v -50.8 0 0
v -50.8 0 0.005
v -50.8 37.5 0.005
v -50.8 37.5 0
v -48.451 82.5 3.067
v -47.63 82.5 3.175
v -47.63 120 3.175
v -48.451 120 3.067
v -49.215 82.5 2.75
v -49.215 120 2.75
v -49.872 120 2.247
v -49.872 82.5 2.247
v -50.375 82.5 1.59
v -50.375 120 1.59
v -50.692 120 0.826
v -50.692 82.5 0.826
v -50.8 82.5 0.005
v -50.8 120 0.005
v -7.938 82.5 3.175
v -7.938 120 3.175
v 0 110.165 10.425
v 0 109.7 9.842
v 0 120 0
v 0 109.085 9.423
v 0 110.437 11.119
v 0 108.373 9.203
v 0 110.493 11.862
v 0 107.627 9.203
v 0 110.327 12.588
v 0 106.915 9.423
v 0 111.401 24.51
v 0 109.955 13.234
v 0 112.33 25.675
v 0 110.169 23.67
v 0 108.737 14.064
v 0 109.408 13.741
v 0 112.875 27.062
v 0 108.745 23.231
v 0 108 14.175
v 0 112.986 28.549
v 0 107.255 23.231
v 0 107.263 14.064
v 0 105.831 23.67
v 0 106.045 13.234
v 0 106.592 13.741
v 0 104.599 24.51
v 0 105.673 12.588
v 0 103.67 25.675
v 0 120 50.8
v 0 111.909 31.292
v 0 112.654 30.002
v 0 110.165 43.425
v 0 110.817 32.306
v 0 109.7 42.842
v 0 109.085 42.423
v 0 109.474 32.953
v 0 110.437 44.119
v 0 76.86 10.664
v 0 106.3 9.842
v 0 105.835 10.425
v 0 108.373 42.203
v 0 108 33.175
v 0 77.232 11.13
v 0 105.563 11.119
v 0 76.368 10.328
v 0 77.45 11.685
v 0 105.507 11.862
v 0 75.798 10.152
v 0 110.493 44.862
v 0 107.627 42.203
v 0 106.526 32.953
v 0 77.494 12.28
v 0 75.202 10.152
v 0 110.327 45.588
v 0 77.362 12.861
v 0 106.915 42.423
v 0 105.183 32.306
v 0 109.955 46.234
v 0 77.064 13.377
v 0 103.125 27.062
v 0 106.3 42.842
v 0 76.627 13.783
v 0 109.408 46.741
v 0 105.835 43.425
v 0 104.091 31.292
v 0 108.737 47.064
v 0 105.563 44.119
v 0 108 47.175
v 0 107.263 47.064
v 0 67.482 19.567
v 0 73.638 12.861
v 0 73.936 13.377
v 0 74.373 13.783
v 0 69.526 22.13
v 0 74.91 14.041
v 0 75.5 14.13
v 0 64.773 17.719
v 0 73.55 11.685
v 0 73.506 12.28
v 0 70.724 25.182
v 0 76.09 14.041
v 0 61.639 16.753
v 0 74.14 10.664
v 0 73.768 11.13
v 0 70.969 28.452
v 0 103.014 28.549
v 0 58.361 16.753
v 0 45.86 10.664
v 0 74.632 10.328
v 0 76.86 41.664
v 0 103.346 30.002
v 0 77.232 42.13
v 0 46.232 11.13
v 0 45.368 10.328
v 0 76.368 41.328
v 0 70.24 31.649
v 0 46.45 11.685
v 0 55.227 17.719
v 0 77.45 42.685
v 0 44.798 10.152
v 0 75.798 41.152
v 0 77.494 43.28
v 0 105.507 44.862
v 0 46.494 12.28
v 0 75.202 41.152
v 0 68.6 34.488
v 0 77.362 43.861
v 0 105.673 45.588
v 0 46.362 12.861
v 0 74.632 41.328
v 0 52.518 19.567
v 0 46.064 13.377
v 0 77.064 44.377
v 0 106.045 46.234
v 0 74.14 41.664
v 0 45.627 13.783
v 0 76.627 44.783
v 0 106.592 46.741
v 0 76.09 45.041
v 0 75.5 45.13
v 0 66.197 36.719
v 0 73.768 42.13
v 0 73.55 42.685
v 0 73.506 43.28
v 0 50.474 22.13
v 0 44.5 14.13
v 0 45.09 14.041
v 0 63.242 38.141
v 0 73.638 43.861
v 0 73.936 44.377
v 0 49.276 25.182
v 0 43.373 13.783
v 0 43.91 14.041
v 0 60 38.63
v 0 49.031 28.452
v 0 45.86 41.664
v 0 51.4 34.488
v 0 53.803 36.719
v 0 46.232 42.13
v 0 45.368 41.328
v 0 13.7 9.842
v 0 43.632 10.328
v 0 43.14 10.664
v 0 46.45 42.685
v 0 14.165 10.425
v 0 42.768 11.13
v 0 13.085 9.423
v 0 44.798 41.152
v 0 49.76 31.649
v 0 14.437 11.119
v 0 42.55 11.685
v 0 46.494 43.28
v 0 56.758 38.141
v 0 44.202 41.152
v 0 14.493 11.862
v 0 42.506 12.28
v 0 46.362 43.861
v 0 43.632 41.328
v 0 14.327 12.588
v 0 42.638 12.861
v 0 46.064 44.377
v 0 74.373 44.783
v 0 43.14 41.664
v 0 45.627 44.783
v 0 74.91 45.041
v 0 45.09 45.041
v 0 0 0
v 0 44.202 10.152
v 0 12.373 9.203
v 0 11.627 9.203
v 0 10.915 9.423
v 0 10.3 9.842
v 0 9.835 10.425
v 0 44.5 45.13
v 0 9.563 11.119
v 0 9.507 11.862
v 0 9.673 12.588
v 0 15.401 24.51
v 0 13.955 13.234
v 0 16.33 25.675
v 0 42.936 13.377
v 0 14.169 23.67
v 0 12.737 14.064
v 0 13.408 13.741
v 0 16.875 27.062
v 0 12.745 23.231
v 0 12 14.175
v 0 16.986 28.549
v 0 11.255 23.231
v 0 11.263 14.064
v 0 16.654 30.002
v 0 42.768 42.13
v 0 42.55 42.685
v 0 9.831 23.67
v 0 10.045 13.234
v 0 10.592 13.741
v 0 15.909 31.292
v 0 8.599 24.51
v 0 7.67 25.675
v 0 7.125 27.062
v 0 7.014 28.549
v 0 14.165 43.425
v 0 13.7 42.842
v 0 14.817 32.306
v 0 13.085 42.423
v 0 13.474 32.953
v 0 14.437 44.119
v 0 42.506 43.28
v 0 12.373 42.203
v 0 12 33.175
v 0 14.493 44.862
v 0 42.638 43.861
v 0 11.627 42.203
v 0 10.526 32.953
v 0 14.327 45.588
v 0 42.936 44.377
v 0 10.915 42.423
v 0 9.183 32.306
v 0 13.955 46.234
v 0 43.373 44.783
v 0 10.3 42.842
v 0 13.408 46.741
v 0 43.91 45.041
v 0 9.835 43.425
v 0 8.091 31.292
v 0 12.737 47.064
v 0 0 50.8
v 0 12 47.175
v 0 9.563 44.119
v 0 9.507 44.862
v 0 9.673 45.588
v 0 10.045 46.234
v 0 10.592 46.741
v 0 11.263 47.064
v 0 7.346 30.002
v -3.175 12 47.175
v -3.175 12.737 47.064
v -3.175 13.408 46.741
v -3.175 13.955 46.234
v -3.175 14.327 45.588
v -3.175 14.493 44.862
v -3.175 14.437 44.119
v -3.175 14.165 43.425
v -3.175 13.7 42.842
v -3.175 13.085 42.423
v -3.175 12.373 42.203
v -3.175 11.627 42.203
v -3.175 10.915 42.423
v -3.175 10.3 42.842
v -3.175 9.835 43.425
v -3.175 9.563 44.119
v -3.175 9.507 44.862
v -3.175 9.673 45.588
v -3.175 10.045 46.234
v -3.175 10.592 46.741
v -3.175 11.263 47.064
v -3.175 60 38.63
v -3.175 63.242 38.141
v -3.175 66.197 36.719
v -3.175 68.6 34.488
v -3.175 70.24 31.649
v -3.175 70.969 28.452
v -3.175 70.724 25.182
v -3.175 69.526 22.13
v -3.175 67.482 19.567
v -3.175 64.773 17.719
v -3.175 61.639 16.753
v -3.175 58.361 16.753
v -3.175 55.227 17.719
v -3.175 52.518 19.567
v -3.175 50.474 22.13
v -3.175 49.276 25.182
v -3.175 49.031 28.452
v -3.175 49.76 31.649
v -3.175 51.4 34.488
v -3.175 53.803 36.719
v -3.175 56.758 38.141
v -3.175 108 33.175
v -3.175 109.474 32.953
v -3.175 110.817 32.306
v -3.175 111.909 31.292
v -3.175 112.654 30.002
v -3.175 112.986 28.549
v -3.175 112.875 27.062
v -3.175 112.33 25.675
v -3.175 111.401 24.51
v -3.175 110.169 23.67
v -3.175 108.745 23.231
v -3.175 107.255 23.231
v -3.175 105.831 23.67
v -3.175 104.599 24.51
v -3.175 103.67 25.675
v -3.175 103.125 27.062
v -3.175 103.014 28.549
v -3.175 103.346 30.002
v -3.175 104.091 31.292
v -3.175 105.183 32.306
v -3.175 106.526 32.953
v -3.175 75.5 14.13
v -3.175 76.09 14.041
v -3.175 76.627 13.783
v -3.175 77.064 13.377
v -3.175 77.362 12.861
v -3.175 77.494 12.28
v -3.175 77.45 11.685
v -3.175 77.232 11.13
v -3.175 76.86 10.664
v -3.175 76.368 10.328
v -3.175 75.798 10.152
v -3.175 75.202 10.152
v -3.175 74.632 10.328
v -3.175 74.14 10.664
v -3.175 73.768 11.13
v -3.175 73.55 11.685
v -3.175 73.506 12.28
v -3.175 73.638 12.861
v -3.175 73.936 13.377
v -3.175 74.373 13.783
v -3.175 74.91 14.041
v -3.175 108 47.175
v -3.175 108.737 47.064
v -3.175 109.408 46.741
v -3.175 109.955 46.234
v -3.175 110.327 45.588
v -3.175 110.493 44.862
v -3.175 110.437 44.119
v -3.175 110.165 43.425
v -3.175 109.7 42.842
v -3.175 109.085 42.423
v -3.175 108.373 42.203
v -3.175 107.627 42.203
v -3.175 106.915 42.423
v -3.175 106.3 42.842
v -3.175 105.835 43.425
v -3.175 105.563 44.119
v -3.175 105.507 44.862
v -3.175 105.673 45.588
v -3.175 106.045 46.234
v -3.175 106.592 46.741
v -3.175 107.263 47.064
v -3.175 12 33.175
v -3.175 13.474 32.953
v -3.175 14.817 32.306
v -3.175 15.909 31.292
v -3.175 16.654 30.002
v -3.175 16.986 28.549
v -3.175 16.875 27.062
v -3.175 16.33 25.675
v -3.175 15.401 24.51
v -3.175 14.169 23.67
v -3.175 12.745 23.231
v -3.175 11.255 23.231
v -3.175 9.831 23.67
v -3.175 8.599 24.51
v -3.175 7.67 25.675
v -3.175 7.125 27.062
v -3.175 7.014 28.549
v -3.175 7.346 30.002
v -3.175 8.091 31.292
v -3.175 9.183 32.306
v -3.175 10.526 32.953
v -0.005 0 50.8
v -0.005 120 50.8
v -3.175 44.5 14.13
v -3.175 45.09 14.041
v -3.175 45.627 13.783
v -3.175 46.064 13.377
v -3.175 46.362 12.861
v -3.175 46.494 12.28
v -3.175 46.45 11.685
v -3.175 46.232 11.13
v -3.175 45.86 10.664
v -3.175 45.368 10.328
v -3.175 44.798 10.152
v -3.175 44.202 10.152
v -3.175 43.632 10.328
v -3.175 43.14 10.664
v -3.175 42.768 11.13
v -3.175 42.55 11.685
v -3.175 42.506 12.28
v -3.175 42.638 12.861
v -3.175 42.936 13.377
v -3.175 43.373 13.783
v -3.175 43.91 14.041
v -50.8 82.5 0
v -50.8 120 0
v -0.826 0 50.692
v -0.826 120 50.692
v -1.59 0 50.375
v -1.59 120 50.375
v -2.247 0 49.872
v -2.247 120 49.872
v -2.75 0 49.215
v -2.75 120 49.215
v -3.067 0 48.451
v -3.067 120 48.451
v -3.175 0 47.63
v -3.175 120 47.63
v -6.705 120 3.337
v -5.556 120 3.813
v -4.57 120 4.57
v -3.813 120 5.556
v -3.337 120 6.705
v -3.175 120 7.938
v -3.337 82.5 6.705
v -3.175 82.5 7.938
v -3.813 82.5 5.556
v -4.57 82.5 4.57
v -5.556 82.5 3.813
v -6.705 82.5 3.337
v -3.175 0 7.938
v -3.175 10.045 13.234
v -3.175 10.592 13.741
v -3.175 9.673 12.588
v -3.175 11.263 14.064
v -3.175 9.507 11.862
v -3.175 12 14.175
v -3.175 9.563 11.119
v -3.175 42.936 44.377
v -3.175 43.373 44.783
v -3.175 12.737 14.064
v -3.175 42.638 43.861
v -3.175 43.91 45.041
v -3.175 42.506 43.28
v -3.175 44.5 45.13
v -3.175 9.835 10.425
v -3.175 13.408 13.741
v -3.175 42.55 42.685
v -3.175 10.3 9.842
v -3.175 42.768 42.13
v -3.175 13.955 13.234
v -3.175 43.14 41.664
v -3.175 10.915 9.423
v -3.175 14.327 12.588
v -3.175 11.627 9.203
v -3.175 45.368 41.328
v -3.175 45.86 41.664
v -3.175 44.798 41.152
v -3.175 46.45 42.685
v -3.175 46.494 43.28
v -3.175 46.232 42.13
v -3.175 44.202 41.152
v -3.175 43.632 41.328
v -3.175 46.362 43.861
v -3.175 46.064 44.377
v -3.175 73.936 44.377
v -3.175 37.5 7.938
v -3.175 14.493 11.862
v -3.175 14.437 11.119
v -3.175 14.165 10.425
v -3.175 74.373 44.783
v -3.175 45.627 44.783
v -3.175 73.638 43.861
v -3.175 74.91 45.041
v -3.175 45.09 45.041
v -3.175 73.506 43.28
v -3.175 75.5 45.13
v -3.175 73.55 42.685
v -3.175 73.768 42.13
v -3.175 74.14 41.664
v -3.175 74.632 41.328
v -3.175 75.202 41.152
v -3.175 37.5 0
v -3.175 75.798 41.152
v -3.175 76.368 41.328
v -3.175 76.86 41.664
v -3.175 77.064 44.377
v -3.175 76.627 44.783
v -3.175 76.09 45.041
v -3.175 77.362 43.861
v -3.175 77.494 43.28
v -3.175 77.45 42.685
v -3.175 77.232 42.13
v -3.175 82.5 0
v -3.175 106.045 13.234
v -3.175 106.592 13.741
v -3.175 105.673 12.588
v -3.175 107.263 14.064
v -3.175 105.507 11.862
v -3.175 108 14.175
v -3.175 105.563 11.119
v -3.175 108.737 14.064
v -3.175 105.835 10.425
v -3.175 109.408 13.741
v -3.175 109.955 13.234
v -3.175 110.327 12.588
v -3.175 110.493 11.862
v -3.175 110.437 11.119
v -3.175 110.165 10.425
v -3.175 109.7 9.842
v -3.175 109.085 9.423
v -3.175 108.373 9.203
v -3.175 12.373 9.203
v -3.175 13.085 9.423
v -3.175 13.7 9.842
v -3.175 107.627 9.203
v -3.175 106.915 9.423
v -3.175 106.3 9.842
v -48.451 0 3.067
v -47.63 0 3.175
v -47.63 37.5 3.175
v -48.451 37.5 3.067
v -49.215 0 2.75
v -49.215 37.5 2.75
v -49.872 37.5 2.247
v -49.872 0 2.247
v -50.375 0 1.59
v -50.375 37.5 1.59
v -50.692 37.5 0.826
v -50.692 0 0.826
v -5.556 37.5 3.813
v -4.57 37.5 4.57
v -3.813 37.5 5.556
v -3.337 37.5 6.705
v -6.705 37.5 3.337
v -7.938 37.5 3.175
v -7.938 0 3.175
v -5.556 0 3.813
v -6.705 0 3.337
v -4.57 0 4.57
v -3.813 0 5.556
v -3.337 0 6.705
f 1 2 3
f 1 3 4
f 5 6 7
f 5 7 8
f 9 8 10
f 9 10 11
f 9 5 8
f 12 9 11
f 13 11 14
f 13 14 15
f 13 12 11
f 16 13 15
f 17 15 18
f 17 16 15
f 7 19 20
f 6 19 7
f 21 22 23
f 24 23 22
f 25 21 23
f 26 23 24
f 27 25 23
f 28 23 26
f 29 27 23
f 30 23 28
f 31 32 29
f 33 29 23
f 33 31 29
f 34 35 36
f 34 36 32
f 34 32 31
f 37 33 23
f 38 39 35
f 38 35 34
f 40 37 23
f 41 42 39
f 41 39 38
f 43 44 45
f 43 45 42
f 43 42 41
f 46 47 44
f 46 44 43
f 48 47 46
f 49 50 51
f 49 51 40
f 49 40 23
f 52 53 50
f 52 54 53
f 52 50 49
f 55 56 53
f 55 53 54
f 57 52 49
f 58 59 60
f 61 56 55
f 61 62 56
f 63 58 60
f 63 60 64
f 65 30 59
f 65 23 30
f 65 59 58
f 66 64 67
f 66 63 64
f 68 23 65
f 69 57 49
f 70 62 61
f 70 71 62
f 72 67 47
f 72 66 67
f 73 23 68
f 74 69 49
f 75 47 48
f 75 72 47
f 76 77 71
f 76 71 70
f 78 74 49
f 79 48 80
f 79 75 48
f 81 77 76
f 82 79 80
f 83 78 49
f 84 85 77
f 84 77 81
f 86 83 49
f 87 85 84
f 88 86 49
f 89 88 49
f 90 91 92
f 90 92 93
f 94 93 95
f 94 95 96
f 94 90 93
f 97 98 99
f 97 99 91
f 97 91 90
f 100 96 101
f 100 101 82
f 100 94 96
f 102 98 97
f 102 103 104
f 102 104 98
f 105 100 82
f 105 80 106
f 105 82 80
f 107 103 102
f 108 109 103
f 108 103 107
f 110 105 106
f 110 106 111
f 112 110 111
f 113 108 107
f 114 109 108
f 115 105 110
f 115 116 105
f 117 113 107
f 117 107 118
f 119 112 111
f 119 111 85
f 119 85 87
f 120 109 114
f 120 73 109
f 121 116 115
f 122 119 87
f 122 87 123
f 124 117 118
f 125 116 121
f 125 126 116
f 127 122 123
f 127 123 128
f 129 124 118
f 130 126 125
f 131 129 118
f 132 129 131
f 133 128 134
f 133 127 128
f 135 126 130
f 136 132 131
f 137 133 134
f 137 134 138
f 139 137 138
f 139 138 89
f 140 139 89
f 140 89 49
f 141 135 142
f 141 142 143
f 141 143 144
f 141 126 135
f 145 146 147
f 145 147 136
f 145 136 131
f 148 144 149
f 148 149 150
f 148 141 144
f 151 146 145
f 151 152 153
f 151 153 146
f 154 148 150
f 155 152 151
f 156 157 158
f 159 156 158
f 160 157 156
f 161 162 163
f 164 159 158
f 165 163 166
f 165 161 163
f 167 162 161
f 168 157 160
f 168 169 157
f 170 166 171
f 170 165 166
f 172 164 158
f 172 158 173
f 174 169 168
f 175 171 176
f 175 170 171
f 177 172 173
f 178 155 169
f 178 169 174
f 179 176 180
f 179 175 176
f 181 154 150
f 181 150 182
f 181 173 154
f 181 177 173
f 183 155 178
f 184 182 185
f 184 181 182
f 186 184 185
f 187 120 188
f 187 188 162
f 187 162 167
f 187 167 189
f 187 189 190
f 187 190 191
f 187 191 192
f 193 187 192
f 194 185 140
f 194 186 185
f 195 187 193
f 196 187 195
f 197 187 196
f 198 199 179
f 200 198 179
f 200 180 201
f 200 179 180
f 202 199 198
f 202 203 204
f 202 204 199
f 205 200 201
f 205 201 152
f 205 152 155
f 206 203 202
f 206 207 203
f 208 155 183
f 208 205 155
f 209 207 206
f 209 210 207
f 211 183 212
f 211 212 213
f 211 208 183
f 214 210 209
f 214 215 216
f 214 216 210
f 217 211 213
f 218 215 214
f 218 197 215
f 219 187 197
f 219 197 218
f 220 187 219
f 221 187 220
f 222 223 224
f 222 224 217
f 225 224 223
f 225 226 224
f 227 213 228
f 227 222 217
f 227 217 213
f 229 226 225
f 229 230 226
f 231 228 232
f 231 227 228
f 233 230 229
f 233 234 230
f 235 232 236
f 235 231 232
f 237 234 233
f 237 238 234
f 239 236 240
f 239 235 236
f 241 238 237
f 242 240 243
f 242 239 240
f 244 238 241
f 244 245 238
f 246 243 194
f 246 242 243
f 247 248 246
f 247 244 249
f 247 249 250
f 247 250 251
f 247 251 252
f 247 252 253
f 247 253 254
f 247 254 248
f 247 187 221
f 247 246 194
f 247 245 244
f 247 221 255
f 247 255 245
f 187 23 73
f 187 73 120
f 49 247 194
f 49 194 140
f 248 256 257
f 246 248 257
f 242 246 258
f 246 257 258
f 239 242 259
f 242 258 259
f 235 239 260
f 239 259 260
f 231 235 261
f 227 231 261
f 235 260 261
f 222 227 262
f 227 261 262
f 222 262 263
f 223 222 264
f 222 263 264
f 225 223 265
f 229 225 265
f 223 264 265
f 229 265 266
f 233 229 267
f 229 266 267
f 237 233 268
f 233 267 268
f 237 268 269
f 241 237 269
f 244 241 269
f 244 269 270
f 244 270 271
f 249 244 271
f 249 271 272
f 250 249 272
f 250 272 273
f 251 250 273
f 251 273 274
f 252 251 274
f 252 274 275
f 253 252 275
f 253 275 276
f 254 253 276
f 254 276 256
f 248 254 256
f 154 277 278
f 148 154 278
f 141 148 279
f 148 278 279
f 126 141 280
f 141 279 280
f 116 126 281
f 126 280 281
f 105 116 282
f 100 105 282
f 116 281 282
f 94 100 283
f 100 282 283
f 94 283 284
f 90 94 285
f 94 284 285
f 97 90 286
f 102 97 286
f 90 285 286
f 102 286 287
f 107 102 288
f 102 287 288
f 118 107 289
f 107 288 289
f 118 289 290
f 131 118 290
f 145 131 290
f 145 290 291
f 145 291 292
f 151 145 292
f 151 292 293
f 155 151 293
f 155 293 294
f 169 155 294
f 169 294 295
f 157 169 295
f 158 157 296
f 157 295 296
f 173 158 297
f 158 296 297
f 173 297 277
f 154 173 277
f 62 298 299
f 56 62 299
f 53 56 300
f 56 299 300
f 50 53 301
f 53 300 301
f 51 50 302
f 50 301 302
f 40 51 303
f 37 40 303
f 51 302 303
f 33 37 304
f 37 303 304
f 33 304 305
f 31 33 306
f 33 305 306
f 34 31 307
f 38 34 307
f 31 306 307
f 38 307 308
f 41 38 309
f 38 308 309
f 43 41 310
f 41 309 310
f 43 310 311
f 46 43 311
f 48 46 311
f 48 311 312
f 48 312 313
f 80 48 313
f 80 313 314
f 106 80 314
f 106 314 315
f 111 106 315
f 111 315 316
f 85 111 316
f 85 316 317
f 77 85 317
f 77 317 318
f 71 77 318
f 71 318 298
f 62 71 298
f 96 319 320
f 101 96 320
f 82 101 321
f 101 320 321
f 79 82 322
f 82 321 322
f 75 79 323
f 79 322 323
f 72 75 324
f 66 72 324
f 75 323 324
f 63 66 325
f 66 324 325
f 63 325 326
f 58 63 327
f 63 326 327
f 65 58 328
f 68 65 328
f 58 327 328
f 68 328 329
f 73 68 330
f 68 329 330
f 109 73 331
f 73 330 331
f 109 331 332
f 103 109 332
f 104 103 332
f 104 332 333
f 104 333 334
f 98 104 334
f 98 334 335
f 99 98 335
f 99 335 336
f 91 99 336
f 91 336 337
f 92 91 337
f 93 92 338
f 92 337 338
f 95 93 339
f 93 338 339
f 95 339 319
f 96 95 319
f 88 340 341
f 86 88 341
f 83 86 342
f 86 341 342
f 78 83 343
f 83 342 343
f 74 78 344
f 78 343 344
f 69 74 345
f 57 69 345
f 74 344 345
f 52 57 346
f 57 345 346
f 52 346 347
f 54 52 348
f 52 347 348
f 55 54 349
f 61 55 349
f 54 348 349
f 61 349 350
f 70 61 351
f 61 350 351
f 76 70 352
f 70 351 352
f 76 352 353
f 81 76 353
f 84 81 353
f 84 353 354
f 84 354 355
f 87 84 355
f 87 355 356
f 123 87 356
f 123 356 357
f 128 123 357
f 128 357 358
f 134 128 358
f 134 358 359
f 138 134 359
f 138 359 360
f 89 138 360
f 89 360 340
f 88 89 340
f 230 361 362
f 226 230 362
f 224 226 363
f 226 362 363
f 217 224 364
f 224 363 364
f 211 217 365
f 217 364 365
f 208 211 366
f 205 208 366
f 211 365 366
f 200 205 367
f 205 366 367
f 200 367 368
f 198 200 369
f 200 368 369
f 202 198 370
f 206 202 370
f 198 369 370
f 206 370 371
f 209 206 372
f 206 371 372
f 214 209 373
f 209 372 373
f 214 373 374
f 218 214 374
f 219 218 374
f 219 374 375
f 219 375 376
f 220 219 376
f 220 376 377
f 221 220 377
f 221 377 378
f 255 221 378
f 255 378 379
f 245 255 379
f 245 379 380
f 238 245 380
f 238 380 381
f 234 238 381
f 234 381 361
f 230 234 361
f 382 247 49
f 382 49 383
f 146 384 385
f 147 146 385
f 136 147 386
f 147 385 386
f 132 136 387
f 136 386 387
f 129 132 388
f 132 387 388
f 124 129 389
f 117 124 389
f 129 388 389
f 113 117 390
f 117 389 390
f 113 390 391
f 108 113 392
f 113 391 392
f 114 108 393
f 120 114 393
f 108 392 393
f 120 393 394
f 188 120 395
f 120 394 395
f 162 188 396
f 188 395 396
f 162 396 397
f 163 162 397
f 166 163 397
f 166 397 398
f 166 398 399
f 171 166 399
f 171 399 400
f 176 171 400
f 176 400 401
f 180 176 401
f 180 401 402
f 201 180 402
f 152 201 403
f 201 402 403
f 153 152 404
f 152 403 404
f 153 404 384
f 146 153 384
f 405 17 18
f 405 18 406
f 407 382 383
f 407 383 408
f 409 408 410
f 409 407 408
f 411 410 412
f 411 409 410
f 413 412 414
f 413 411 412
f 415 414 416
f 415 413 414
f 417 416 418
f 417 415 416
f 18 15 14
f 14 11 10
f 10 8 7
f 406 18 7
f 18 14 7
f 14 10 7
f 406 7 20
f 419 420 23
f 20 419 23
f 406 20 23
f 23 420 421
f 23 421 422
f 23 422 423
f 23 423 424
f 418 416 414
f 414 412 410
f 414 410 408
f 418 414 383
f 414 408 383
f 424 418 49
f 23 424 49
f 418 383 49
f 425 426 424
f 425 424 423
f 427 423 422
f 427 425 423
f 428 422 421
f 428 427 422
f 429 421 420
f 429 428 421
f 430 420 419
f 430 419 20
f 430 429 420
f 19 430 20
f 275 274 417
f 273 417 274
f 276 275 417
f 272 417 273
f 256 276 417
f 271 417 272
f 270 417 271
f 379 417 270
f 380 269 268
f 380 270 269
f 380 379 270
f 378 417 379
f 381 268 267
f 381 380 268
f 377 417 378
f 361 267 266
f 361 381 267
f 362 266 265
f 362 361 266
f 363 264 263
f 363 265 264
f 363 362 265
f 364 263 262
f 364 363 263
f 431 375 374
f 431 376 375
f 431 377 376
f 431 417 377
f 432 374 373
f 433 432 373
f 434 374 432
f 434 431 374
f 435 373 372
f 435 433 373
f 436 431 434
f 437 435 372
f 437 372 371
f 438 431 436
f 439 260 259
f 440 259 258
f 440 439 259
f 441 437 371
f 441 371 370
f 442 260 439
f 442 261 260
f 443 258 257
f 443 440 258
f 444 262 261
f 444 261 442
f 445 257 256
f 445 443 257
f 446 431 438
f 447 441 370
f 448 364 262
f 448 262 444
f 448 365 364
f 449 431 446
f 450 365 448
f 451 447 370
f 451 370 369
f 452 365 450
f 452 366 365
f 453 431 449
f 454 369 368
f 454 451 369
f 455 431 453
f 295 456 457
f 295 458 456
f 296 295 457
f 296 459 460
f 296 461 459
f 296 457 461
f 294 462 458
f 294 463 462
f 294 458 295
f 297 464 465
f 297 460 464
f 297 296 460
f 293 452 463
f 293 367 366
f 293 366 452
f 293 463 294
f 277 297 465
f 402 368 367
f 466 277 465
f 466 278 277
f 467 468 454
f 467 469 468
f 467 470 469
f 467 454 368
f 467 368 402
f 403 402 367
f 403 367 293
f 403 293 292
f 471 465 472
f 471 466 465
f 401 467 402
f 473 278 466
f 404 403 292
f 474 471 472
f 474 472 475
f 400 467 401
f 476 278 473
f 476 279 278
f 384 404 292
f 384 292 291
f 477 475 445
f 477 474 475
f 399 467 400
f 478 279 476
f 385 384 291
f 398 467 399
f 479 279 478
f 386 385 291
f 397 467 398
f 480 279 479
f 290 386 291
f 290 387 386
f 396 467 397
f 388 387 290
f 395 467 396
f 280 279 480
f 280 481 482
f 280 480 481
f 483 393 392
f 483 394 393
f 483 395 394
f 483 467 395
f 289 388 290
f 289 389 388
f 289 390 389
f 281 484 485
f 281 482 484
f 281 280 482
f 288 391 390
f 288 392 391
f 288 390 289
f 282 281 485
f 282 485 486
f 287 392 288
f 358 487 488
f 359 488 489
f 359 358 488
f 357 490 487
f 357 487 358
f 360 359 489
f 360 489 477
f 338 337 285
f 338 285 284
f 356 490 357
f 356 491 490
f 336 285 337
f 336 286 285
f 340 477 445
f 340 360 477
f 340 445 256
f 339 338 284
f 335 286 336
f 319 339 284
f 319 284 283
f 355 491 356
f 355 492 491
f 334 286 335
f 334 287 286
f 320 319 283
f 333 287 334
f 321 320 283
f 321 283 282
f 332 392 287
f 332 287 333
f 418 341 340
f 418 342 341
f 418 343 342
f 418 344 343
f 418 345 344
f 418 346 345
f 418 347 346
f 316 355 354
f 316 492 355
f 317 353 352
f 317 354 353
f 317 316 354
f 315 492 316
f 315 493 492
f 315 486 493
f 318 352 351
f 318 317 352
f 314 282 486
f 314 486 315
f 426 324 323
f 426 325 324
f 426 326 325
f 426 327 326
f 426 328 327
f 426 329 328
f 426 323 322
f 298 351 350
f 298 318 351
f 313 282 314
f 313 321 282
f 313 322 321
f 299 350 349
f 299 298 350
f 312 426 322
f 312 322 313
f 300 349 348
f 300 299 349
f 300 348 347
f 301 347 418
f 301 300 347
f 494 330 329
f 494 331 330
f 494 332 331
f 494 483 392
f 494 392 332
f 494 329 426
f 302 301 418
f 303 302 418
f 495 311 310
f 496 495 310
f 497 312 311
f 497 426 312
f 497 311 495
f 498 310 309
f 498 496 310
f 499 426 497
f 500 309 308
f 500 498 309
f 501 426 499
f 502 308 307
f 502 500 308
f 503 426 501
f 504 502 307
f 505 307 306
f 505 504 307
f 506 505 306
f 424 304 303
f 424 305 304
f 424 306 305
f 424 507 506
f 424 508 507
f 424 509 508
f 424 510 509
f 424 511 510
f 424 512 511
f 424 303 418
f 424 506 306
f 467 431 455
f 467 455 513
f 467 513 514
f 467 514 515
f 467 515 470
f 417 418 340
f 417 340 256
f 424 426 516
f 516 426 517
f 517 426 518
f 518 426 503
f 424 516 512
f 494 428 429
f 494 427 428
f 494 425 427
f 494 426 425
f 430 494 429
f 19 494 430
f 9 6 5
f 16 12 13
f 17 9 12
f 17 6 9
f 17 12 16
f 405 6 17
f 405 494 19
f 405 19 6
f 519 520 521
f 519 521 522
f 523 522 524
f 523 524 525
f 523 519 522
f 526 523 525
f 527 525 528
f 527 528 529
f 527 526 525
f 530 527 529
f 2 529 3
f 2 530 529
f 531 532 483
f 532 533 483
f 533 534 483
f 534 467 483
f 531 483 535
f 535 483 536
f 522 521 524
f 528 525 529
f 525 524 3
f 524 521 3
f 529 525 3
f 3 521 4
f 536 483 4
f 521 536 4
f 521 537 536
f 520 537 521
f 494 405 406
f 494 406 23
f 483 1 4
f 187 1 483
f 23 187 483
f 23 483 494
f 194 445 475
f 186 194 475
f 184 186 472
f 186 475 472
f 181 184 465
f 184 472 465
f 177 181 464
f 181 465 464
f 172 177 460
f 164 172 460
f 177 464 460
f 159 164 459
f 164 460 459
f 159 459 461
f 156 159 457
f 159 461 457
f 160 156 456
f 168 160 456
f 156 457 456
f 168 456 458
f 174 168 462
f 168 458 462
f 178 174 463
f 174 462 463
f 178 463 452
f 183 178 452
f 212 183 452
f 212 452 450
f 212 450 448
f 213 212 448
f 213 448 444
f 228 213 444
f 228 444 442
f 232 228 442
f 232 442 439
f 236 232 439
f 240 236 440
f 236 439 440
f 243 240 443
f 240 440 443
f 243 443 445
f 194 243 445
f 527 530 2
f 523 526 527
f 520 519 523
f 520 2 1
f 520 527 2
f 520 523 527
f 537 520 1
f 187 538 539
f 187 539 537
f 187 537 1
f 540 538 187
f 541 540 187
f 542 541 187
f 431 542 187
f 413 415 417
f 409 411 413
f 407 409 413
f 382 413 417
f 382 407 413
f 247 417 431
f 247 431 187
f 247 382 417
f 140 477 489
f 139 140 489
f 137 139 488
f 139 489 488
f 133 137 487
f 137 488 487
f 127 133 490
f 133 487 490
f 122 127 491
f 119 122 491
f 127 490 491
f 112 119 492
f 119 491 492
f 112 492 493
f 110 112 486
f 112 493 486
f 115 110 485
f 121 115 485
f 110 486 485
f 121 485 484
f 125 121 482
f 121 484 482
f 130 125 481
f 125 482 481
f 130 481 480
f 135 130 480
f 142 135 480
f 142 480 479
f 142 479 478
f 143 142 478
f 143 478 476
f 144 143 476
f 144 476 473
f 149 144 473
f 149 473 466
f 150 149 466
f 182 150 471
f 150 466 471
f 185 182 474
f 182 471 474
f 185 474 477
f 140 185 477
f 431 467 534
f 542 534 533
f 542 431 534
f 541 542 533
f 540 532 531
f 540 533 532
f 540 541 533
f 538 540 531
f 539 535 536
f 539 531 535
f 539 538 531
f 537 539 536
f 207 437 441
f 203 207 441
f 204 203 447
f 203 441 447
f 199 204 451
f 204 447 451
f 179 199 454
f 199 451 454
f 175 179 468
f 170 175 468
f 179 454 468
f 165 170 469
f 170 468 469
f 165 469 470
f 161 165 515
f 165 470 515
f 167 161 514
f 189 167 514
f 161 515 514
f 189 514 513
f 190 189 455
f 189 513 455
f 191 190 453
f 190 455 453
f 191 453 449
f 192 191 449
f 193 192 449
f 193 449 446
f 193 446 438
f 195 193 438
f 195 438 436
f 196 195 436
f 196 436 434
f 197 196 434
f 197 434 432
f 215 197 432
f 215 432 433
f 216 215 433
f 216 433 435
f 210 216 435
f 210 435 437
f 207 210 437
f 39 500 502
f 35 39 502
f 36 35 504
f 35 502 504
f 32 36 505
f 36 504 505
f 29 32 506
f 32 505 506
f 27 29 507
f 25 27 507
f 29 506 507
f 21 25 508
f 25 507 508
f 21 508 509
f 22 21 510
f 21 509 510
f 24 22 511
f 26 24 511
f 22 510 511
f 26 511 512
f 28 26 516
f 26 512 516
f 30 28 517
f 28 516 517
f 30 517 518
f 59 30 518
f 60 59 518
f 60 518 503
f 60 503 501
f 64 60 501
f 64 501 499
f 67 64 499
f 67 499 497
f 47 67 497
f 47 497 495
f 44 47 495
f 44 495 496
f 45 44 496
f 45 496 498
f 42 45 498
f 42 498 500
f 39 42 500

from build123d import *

# Parameters (mm, degrees)
HIERRO_ANGULAR_2_X_2_X_0_125_1_DEPTH = 120
CROQUIS3_W                           = 47.625
CROQUIS3_H                           = 45
CORTAR_EXTRUIR1_DEPTH                = 10
CROQUIS4_R                           = 5
CROQUIS4_R_2                         = 2.5
CORTAR_EXTRUIR2_DEPTH                = 10
CROQUIS5_R                           = 2
CROQUIS5_R_2                         = 11
CORTAR_EXTRUIR3_DEPTH                = 3.175


with BuildPart() as part:
    # Sketch1 → Hierro angular 2 X 2 X 0.125(1) (new body)
    with BuildSketch(Plane(origin=(0, 0, 0), x_dir=(-1, 0, 0), z_dir=(0, 1, 0))):
        with BuildLine():
            Line((0, 0), (0, 50.8))
            Line((0, 50.8), (0.00508, 50.8))
            ThreePointArc((0.00508, 50.8), (2.246551928, 49.871551928), (3.175, 47.63008))
            Line((3.175, 47.63008), (3.175, 7.9375))
            ThreePointArc((3.175, 7.9375), (4.569903955, 4.569903955), (7.9375, 3.175))
            Line((7.9375, 3.175), (47.63008, 3.175))
            ThreePointArc((47.63008, 3.175), (49.871551928, 2.246551928), (50.8, 0.00508))
            Line((50.8, 0.00508), (50.8, 0))
            Line((50.8, 0), (0, 0))
        make_face()
    extrude(amount=HIERRO_ANGULAR_2_X_2_X_0_125_1_DEPTH)

    # Croquis3 → Cortar-Extruir1 (cut)
    with BuildSketch(Plane(origin=(0, 0, 0), x_dir=(-1, 0, 0), z_dir=(0, 0, -1))):
        with Locations((26.9875, 60)):
            Rectangle(CROQUIS3_W, CROQUIS3_H)
    extrude(amount=-CORTAR_EXTRUIR1_DEPTH, mode=Mode.SUBTRACT)

    # Croquis4 → Cortar-Extruir2 (cut)
    with BuildSketch(Plane.ZY.offset(3.175)):
        with Locations((28.175, 12)):
            Circle(CROQUIS4_R)
        with Locations((11.675, 12)):
            Circle(CROQUIS4_R_2)
        with Locations((44.675, 12)):
            Circle(CROQUIS4_R_2)
        with Locations((44.675, 108)):
            Circle(CROQUIS4_R_2)
        with Locations((28.175, 108)):
            Circle(CROQUIS4_R)
        with Locations((11.675, 108)):
            Circle(CROQUIS4_R_2)
    extrude(amount=-CORTAR_EXTRUIR2_DEPTH, mode=Mode.SUBTRACT)

    # Croquis5 → Cortar-Extruir3 (cut)
    with BuildSketch(Plane.ZY.offset(3.175)):
        with Locations((43.13008, 75.5)):
            Circle(CROQUIS5_R)
        with Locations((43.13008, 44.5)):
            Circle(CROQUIS5_R)
        with Locations((12.13008, 44.5)):
            Circle(CROQUIS5_R)
        with Locations((12.13008, 75.5)):
            Circle(CROQUIS5_R)
        with Locations((27.63008, 60)):
            Circle(CROQUIS5_R_2)
    extrude(amount=-CORTAR_EXTRUIR3_DEPTH, mode=Mode.SUBTRACT)


solid = part.part
